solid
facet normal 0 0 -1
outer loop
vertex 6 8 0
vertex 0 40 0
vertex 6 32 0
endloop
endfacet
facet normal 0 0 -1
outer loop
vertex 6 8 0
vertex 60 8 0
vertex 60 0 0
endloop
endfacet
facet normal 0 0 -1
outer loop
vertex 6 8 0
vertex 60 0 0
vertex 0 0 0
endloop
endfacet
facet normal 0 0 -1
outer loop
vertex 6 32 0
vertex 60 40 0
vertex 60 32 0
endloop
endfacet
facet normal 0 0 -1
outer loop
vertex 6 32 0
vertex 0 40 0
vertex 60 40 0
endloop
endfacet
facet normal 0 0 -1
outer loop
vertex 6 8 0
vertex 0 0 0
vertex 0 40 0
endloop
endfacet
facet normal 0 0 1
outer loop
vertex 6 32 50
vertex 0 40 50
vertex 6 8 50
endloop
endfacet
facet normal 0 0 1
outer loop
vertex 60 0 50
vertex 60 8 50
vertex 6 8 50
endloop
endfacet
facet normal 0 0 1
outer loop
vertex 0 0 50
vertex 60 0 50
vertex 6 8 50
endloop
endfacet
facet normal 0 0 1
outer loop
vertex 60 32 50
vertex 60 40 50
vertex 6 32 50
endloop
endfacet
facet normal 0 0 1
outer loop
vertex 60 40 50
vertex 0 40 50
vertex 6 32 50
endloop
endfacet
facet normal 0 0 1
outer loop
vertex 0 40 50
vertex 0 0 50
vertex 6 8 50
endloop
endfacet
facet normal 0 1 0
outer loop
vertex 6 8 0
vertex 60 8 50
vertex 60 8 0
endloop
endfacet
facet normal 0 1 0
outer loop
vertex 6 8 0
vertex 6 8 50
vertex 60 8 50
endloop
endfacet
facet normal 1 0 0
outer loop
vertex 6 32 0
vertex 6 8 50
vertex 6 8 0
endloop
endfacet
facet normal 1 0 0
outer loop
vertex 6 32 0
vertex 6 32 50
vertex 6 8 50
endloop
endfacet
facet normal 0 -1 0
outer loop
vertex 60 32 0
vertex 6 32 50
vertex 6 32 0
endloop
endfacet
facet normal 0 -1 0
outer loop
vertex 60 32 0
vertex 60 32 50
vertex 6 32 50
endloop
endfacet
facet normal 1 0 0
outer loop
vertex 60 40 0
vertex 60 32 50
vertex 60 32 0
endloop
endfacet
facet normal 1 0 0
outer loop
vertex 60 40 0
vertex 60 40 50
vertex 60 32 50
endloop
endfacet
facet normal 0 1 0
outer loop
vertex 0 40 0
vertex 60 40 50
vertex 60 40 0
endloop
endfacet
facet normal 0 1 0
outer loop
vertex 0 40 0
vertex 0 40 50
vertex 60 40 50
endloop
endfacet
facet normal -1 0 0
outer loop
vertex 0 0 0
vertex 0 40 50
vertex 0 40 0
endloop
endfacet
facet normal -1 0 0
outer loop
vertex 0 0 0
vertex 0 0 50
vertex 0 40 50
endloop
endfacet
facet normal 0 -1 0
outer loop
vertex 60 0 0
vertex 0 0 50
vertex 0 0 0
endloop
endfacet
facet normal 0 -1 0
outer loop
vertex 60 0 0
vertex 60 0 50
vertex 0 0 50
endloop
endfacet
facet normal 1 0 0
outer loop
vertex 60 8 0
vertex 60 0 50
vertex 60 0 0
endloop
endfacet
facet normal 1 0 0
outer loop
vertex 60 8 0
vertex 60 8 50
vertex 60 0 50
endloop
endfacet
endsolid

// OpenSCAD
$fn = 32;

// ----------------------------------------------------------------------
// Structural section: channel 60 x 40 mm
// ----------------------------------------------------------------------

// --- parameters (mm) ---
sec_w = 60;               // channel width, X
sec_h = 40;               // channel height, Y
flange_t = 8;             // flange thickness
web_t = 6;                // web thickness
plate_t = 50;             // cut length, Z (extrusion height)

profile = [[0, 0], [60, 0], [60, 8], [6, 8], [6, 32], [60, 32], [60, 40], [0, 40]];  // primary outline, 8 points, counter clockwise

// --- the one profile operation ---
linear_extrude(height = plate_t) polygon(points = profile);
